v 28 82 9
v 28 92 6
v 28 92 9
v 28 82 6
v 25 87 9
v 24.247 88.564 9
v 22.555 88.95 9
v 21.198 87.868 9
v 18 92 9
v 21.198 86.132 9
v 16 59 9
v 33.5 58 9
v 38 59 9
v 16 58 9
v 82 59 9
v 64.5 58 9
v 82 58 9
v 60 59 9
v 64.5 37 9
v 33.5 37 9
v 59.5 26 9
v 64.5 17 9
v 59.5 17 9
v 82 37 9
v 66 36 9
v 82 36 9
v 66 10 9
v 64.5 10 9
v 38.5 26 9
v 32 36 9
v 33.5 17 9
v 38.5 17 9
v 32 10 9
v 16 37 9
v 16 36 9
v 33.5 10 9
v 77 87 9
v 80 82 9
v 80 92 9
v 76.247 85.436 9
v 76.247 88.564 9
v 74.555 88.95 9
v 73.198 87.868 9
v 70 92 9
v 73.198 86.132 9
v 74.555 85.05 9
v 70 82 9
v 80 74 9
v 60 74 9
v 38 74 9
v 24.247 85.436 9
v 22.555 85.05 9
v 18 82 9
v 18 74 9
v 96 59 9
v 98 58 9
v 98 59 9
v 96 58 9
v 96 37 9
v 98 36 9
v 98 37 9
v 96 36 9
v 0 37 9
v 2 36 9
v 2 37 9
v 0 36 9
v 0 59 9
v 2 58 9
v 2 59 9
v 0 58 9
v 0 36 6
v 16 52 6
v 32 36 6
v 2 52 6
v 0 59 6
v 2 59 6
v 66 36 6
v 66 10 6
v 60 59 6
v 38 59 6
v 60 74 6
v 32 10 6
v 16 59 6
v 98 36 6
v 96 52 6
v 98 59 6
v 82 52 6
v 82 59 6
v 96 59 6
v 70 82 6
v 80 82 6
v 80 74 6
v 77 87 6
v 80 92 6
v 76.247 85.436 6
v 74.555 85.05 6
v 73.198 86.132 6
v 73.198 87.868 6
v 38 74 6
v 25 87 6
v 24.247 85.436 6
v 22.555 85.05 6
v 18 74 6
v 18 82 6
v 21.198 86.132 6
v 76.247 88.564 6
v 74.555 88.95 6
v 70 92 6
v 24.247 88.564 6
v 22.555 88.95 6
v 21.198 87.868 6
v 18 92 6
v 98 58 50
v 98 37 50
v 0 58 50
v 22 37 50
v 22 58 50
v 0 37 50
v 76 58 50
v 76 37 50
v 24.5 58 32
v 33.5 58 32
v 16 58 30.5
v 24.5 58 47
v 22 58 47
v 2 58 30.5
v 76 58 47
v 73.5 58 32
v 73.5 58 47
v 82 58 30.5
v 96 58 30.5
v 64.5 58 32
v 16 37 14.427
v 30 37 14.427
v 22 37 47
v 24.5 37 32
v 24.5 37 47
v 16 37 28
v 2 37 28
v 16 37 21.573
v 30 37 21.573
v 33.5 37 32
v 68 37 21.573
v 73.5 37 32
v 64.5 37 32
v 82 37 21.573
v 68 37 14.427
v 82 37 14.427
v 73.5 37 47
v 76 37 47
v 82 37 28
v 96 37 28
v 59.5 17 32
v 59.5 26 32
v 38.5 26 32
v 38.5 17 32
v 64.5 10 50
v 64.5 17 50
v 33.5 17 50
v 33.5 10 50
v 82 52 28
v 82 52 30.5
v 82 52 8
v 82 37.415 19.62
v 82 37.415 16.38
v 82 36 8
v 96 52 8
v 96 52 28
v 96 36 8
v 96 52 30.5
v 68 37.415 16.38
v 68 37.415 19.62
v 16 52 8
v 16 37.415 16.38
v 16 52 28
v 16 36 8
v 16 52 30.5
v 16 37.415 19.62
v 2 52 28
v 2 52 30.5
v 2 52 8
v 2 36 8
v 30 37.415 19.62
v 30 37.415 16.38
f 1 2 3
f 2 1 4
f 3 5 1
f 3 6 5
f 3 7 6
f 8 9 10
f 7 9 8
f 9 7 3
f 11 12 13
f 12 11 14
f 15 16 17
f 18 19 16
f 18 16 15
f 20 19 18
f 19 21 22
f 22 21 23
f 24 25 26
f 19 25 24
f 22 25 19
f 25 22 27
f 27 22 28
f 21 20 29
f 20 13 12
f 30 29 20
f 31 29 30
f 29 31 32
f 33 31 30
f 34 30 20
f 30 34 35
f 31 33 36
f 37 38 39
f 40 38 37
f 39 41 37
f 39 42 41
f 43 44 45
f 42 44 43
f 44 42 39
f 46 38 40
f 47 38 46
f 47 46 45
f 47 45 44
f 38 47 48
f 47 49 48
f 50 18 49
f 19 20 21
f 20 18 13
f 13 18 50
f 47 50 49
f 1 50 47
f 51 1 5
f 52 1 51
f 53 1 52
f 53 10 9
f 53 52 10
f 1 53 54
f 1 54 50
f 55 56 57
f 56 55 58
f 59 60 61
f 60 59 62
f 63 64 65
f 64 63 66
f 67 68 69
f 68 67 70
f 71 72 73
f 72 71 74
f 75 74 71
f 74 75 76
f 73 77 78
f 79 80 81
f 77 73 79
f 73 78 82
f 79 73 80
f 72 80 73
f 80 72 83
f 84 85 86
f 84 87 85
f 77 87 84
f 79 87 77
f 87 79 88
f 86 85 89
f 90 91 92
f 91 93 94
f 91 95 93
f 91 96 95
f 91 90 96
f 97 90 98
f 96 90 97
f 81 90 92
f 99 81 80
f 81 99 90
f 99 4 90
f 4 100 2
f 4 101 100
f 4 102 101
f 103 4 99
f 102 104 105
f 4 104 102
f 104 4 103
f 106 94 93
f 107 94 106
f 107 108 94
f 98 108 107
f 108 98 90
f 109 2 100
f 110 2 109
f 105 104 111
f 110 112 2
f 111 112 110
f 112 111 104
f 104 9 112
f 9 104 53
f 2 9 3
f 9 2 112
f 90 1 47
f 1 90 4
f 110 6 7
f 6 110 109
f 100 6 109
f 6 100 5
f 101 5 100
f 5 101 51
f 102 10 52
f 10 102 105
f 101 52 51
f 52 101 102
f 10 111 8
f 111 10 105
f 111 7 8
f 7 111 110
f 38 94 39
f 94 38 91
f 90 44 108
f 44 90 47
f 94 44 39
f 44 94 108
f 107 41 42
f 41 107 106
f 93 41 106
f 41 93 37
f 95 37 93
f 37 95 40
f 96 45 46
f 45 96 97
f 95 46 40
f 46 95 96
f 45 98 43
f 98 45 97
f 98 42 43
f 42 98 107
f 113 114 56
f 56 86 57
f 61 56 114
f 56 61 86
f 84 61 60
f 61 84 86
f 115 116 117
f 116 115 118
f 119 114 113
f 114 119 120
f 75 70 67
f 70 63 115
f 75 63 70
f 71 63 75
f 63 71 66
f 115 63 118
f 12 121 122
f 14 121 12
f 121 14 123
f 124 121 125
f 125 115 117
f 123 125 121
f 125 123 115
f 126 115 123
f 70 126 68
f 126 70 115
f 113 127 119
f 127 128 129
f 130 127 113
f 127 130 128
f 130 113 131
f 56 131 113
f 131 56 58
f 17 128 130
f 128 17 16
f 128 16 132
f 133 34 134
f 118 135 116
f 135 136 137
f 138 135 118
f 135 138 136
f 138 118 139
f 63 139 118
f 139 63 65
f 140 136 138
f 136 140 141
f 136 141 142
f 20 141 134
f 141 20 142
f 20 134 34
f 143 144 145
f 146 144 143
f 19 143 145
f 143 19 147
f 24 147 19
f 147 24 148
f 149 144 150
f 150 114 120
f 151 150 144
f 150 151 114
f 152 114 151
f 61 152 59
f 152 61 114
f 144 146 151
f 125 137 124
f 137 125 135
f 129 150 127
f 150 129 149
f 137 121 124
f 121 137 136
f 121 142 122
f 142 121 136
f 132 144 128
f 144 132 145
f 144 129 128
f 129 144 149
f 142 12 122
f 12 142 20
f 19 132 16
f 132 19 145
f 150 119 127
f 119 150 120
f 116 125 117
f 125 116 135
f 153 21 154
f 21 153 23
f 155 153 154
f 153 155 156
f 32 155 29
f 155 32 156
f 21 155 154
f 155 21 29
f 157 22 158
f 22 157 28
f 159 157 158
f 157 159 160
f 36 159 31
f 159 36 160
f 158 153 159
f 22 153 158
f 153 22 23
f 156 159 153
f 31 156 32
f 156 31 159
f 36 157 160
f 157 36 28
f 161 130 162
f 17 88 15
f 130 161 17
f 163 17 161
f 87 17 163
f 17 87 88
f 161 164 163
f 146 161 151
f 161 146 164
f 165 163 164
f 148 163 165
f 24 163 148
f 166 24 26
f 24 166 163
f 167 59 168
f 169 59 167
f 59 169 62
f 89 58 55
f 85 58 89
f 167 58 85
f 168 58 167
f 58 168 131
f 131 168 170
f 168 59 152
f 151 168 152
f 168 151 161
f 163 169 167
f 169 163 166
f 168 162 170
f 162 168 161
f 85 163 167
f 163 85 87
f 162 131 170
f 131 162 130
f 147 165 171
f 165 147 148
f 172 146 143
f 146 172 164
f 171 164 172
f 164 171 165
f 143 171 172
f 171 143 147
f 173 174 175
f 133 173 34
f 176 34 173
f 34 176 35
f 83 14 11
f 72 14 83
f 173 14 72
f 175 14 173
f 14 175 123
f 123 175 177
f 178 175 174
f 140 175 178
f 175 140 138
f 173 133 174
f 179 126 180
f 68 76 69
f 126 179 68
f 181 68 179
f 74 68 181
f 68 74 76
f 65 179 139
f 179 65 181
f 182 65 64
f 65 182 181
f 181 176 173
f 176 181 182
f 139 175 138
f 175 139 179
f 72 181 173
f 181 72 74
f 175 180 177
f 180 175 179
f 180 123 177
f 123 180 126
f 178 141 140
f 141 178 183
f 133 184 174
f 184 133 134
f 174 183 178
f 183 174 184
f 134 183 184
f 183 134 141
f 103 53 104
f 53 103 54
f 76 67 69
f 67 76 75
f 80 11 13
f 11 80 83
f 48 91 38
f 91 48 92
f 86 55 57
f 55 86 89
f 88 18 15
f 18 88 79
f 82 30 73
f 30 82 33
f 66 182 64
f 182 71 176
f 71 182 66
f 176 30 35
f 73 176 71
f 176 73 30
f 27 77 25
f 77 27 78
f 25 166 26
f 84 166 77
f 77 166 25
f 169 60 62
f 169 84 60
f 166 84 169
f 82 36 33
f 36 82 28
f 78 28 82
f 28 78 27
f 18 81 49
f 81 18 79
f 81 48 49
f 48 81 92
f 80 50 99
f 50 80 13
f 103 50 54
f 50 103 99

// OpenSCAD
/* Hive13 SumoBot Chassis/Frame */

// The front plow takes up a depth of 16.
// Some space is used for linesensor screw holes ~14mm

max_w = 98;
max_d = 98 - 16;

batterypack_w = 63;
batterypack_h = 15;
batterypack_d = 49;

bpack2_w = 54;
bpack2_h = 11;
bpack2_d = 31;

micro_w = 70;
micro_h = 15; // We just go to the top of the shield
micro_d = 54;

frame_w = max_w;
frame_h = 3;
frame_d = max_d;

// tire + motor thickness ~30 
wheel_radius = 15.5;
wheel_thickness = 14;
motor_w =14;
motor_h = 58;
motor_d = 20;
lip_w = motor_w;
lip_h = 18;
lip_d = 25;
lip_dist_from_bottom_motor = 40;
tire_distance = 9;

linesensor_spacing = 18;
linesensor_depth = 23;
frame_wheel_d = 36;
wheel_clearance = 12;
backwall_thickness = 15;

module baseframe() {
	difference() {
		union() {
		   cube([frame_w, frame_d, frame_h]);
		   // mounting tabs
		   translate(v=[linesensor_spacing, frame_d, 0]) {
			difference() {
			   cube([10, 10, frame_h]);
			   translate(v=[5, 5, 0]) {
				   cylinder(r = 2, h=frame_h);
			   }
			}
		   }
		   translate(v=[frame_w-linesensor_spacing-10, frame_d, 0]) {
			difference() {
			   cube([10, 10, frame_h]);
			   translate(v=[5, 5, 0]) {
				   cylinder(r = 2, h=frame_h);
			   }
			}
		   }
		   // Wheel/Motor holder block
		  difference() // subtract out overhangs and wire section
		  {
			  translate(v = [0,frame_wheel_d+1,frame_h]) {
				cube([frame_w, frame_d -(frame_wheel_d + linesensor_depth)-2, batterypack_h + bpack2_h + micro_h]);
			  }
			  // Removes space over motors
			 // translate(v = [2,frame_wheel_d+1,frame_h +bpack2_h]) {
			//	cube([motor_w, frame_d -(frame_wheel_d + linesensor_depth-1), batterypack_h + micro_h]);
			 // }
			  //translate(v = [frame_w-motor_w-2,frame_wheel_d+1,frame_h +bpack2_h]) {
			//	cube([motor_w, frame_d -(frame_wheel_d + linesensor_depth-1), batterypack_h + micro_h]);
			 // }
			  // Remove area over batterypacks
			  translate(v = [(frame_w + batterypack_d) / 2, frame_d-batterypack_w, frame_h+bpack2_h+wheel_clearance]) {
				  rotate([0,0,90]) {
					batterypack();
				  }
			}

			translate(v = [(frame_w + bpack2_d) /2,frame_d-bpack2_w,frame_h]) {
				  rotate([0,0,90]) {
					  //bpack2();
					 cube([bpack2_w, bpack2_d, bpack2_h+wheel_clearance]);
				  }
			}
			 translate(v = [(frame_w - micro_d) / 2, frame_d-batterypack_w, frame_h+bpack2_h+batterypack_h+wheel_clearance]) {
				   cube([micro_d, batterypack_w, 40]);
			}

		  }
		  // Backwall
		  translate(v=[(frame_w + bpack2_d+10) /2-bpack2_d,frame_d-bpack2_w-backwall_thickness-2,frame_h]) {
			cube([bpack2_d-10, backwall_thickness, bpack2_h+wheel_clearance]);
		  }
		  // Backwall second piece
		  translate(v = [(frame_w + bpack2_d)/2-bpack2_d,10,frame_h]) {
			cube([bpack2_d, 7, bpack2_h+micro_h+batterypack_h]);
		  }
		} // union


		// Remove linesensor area
		translate(v = [0,frame_d-linesensor_depth,0]) {
			cube([linesensor_spacing, linesensor_depth, frame_h]);
		}
		translate(v = [frame_w - linesensor_spacing,frame_d-linesensor_depth,0]) {
			cube([linesensor_spacing, linesensor_depth, frame_h]);
		}
		// Remove tires
		translate(v = [0,0,0]) {
			cube([motor_w + wheel_thickness + 4, frame_wheel_d, frame_h]);
		}
		translate(v = [frame_w-motor_w-wheel_thickness-4,0,0]) {
			cube([motor_w + wheel_thickness + 4, frame_wheel_d, frame_h]);
		}
		// Remove unneeded space in the back
		translate(v =[(frame_w + bpack2_d-5) /2-bpack2_d,0,0]) {
			cube([bpack2_d+10, 10, frame_h]);
		}
                // Remove a hole for power switch
                translate(v = [frame_w-linesensor_spacing-20,frame_d-linesensor_depth,0]) {
                        cube([20, 15, frame_h]);
                }
		// This one is mainly for looks
		translate(v = [linesensor_spacing,frame_d-linesensor_depth,0]) {
			cube([20, 15, frame_h]);
		}
		// Remove the wheels
		// Right Tire
		translate(v = [max_w-2, 12,-motor_d+22]) {
			rotate(a = [270, 180, 0]) {
				motor();
			}
		}
		// Left Tire
		translate(v = [2, 12, 22]) {
			rotate(a = [270, 0, 0]) {
				motor();
			}
		}

	} // difference
}

module batterypack() {
  color([0, 127, 127, 255]) {
   cube([batterypack_w, batterypack_d, batterypack_h]);
  }
}

module bpack2() {
  color([127,127,0,255]) {
   cube([bpack2_w, bpack2_d, bpack2_h]);
  }
}

module micro() {
   cube([micro_w, micro_d, micro_h]);
}

module motor() {
  color([0,0,0,255]) {
     union() {
	   cube([motor_w, motor_d, motor_h]);
	  // Lip
	translate(v = [0, -(lip_d-motor_d)/2, lip_dist_from_bottom_motor]) {
		cube([lip_w, lip_d, lip_h]);
          }
	// wheel
         translate(v = [motor_w,motor_d/2,motor_d/2]) {
	    rotate(a = [90, 0, 90]) {
		cylinder(r = wheel_radius, h = wheel_thickness);
	    }
	}
      }
  }
}

translate(v =[0,0,6]) {
	baseframe();
}

//max base
//cube([max_w, max_d, 1]);
/*
// Right Tire
translate(v = [max_w-2, 12, -1]) {
	rotate(a = [250, 180, 0]) {
		motor();
	}
}
// Left Tire
translate(v = [2, 4, 22]) {
	rotate(a = [290, 0, 0]) {
		motor();
	}
}

translate(v = [(frame_w + bpack2_d) /2,frame_d-bpack2_w,frame_h+6]) {
  rotate([0,0,90]) {
	  bpack2();
  }
}

translate(v = [(frame_w + batterypack_d) / 2, frame_d-batterypack_w, frame_h+6+bpack2_h+wheel_clearance]) {
  rotate([0,0,90]) {
	batterypack();
  }
}


*/
